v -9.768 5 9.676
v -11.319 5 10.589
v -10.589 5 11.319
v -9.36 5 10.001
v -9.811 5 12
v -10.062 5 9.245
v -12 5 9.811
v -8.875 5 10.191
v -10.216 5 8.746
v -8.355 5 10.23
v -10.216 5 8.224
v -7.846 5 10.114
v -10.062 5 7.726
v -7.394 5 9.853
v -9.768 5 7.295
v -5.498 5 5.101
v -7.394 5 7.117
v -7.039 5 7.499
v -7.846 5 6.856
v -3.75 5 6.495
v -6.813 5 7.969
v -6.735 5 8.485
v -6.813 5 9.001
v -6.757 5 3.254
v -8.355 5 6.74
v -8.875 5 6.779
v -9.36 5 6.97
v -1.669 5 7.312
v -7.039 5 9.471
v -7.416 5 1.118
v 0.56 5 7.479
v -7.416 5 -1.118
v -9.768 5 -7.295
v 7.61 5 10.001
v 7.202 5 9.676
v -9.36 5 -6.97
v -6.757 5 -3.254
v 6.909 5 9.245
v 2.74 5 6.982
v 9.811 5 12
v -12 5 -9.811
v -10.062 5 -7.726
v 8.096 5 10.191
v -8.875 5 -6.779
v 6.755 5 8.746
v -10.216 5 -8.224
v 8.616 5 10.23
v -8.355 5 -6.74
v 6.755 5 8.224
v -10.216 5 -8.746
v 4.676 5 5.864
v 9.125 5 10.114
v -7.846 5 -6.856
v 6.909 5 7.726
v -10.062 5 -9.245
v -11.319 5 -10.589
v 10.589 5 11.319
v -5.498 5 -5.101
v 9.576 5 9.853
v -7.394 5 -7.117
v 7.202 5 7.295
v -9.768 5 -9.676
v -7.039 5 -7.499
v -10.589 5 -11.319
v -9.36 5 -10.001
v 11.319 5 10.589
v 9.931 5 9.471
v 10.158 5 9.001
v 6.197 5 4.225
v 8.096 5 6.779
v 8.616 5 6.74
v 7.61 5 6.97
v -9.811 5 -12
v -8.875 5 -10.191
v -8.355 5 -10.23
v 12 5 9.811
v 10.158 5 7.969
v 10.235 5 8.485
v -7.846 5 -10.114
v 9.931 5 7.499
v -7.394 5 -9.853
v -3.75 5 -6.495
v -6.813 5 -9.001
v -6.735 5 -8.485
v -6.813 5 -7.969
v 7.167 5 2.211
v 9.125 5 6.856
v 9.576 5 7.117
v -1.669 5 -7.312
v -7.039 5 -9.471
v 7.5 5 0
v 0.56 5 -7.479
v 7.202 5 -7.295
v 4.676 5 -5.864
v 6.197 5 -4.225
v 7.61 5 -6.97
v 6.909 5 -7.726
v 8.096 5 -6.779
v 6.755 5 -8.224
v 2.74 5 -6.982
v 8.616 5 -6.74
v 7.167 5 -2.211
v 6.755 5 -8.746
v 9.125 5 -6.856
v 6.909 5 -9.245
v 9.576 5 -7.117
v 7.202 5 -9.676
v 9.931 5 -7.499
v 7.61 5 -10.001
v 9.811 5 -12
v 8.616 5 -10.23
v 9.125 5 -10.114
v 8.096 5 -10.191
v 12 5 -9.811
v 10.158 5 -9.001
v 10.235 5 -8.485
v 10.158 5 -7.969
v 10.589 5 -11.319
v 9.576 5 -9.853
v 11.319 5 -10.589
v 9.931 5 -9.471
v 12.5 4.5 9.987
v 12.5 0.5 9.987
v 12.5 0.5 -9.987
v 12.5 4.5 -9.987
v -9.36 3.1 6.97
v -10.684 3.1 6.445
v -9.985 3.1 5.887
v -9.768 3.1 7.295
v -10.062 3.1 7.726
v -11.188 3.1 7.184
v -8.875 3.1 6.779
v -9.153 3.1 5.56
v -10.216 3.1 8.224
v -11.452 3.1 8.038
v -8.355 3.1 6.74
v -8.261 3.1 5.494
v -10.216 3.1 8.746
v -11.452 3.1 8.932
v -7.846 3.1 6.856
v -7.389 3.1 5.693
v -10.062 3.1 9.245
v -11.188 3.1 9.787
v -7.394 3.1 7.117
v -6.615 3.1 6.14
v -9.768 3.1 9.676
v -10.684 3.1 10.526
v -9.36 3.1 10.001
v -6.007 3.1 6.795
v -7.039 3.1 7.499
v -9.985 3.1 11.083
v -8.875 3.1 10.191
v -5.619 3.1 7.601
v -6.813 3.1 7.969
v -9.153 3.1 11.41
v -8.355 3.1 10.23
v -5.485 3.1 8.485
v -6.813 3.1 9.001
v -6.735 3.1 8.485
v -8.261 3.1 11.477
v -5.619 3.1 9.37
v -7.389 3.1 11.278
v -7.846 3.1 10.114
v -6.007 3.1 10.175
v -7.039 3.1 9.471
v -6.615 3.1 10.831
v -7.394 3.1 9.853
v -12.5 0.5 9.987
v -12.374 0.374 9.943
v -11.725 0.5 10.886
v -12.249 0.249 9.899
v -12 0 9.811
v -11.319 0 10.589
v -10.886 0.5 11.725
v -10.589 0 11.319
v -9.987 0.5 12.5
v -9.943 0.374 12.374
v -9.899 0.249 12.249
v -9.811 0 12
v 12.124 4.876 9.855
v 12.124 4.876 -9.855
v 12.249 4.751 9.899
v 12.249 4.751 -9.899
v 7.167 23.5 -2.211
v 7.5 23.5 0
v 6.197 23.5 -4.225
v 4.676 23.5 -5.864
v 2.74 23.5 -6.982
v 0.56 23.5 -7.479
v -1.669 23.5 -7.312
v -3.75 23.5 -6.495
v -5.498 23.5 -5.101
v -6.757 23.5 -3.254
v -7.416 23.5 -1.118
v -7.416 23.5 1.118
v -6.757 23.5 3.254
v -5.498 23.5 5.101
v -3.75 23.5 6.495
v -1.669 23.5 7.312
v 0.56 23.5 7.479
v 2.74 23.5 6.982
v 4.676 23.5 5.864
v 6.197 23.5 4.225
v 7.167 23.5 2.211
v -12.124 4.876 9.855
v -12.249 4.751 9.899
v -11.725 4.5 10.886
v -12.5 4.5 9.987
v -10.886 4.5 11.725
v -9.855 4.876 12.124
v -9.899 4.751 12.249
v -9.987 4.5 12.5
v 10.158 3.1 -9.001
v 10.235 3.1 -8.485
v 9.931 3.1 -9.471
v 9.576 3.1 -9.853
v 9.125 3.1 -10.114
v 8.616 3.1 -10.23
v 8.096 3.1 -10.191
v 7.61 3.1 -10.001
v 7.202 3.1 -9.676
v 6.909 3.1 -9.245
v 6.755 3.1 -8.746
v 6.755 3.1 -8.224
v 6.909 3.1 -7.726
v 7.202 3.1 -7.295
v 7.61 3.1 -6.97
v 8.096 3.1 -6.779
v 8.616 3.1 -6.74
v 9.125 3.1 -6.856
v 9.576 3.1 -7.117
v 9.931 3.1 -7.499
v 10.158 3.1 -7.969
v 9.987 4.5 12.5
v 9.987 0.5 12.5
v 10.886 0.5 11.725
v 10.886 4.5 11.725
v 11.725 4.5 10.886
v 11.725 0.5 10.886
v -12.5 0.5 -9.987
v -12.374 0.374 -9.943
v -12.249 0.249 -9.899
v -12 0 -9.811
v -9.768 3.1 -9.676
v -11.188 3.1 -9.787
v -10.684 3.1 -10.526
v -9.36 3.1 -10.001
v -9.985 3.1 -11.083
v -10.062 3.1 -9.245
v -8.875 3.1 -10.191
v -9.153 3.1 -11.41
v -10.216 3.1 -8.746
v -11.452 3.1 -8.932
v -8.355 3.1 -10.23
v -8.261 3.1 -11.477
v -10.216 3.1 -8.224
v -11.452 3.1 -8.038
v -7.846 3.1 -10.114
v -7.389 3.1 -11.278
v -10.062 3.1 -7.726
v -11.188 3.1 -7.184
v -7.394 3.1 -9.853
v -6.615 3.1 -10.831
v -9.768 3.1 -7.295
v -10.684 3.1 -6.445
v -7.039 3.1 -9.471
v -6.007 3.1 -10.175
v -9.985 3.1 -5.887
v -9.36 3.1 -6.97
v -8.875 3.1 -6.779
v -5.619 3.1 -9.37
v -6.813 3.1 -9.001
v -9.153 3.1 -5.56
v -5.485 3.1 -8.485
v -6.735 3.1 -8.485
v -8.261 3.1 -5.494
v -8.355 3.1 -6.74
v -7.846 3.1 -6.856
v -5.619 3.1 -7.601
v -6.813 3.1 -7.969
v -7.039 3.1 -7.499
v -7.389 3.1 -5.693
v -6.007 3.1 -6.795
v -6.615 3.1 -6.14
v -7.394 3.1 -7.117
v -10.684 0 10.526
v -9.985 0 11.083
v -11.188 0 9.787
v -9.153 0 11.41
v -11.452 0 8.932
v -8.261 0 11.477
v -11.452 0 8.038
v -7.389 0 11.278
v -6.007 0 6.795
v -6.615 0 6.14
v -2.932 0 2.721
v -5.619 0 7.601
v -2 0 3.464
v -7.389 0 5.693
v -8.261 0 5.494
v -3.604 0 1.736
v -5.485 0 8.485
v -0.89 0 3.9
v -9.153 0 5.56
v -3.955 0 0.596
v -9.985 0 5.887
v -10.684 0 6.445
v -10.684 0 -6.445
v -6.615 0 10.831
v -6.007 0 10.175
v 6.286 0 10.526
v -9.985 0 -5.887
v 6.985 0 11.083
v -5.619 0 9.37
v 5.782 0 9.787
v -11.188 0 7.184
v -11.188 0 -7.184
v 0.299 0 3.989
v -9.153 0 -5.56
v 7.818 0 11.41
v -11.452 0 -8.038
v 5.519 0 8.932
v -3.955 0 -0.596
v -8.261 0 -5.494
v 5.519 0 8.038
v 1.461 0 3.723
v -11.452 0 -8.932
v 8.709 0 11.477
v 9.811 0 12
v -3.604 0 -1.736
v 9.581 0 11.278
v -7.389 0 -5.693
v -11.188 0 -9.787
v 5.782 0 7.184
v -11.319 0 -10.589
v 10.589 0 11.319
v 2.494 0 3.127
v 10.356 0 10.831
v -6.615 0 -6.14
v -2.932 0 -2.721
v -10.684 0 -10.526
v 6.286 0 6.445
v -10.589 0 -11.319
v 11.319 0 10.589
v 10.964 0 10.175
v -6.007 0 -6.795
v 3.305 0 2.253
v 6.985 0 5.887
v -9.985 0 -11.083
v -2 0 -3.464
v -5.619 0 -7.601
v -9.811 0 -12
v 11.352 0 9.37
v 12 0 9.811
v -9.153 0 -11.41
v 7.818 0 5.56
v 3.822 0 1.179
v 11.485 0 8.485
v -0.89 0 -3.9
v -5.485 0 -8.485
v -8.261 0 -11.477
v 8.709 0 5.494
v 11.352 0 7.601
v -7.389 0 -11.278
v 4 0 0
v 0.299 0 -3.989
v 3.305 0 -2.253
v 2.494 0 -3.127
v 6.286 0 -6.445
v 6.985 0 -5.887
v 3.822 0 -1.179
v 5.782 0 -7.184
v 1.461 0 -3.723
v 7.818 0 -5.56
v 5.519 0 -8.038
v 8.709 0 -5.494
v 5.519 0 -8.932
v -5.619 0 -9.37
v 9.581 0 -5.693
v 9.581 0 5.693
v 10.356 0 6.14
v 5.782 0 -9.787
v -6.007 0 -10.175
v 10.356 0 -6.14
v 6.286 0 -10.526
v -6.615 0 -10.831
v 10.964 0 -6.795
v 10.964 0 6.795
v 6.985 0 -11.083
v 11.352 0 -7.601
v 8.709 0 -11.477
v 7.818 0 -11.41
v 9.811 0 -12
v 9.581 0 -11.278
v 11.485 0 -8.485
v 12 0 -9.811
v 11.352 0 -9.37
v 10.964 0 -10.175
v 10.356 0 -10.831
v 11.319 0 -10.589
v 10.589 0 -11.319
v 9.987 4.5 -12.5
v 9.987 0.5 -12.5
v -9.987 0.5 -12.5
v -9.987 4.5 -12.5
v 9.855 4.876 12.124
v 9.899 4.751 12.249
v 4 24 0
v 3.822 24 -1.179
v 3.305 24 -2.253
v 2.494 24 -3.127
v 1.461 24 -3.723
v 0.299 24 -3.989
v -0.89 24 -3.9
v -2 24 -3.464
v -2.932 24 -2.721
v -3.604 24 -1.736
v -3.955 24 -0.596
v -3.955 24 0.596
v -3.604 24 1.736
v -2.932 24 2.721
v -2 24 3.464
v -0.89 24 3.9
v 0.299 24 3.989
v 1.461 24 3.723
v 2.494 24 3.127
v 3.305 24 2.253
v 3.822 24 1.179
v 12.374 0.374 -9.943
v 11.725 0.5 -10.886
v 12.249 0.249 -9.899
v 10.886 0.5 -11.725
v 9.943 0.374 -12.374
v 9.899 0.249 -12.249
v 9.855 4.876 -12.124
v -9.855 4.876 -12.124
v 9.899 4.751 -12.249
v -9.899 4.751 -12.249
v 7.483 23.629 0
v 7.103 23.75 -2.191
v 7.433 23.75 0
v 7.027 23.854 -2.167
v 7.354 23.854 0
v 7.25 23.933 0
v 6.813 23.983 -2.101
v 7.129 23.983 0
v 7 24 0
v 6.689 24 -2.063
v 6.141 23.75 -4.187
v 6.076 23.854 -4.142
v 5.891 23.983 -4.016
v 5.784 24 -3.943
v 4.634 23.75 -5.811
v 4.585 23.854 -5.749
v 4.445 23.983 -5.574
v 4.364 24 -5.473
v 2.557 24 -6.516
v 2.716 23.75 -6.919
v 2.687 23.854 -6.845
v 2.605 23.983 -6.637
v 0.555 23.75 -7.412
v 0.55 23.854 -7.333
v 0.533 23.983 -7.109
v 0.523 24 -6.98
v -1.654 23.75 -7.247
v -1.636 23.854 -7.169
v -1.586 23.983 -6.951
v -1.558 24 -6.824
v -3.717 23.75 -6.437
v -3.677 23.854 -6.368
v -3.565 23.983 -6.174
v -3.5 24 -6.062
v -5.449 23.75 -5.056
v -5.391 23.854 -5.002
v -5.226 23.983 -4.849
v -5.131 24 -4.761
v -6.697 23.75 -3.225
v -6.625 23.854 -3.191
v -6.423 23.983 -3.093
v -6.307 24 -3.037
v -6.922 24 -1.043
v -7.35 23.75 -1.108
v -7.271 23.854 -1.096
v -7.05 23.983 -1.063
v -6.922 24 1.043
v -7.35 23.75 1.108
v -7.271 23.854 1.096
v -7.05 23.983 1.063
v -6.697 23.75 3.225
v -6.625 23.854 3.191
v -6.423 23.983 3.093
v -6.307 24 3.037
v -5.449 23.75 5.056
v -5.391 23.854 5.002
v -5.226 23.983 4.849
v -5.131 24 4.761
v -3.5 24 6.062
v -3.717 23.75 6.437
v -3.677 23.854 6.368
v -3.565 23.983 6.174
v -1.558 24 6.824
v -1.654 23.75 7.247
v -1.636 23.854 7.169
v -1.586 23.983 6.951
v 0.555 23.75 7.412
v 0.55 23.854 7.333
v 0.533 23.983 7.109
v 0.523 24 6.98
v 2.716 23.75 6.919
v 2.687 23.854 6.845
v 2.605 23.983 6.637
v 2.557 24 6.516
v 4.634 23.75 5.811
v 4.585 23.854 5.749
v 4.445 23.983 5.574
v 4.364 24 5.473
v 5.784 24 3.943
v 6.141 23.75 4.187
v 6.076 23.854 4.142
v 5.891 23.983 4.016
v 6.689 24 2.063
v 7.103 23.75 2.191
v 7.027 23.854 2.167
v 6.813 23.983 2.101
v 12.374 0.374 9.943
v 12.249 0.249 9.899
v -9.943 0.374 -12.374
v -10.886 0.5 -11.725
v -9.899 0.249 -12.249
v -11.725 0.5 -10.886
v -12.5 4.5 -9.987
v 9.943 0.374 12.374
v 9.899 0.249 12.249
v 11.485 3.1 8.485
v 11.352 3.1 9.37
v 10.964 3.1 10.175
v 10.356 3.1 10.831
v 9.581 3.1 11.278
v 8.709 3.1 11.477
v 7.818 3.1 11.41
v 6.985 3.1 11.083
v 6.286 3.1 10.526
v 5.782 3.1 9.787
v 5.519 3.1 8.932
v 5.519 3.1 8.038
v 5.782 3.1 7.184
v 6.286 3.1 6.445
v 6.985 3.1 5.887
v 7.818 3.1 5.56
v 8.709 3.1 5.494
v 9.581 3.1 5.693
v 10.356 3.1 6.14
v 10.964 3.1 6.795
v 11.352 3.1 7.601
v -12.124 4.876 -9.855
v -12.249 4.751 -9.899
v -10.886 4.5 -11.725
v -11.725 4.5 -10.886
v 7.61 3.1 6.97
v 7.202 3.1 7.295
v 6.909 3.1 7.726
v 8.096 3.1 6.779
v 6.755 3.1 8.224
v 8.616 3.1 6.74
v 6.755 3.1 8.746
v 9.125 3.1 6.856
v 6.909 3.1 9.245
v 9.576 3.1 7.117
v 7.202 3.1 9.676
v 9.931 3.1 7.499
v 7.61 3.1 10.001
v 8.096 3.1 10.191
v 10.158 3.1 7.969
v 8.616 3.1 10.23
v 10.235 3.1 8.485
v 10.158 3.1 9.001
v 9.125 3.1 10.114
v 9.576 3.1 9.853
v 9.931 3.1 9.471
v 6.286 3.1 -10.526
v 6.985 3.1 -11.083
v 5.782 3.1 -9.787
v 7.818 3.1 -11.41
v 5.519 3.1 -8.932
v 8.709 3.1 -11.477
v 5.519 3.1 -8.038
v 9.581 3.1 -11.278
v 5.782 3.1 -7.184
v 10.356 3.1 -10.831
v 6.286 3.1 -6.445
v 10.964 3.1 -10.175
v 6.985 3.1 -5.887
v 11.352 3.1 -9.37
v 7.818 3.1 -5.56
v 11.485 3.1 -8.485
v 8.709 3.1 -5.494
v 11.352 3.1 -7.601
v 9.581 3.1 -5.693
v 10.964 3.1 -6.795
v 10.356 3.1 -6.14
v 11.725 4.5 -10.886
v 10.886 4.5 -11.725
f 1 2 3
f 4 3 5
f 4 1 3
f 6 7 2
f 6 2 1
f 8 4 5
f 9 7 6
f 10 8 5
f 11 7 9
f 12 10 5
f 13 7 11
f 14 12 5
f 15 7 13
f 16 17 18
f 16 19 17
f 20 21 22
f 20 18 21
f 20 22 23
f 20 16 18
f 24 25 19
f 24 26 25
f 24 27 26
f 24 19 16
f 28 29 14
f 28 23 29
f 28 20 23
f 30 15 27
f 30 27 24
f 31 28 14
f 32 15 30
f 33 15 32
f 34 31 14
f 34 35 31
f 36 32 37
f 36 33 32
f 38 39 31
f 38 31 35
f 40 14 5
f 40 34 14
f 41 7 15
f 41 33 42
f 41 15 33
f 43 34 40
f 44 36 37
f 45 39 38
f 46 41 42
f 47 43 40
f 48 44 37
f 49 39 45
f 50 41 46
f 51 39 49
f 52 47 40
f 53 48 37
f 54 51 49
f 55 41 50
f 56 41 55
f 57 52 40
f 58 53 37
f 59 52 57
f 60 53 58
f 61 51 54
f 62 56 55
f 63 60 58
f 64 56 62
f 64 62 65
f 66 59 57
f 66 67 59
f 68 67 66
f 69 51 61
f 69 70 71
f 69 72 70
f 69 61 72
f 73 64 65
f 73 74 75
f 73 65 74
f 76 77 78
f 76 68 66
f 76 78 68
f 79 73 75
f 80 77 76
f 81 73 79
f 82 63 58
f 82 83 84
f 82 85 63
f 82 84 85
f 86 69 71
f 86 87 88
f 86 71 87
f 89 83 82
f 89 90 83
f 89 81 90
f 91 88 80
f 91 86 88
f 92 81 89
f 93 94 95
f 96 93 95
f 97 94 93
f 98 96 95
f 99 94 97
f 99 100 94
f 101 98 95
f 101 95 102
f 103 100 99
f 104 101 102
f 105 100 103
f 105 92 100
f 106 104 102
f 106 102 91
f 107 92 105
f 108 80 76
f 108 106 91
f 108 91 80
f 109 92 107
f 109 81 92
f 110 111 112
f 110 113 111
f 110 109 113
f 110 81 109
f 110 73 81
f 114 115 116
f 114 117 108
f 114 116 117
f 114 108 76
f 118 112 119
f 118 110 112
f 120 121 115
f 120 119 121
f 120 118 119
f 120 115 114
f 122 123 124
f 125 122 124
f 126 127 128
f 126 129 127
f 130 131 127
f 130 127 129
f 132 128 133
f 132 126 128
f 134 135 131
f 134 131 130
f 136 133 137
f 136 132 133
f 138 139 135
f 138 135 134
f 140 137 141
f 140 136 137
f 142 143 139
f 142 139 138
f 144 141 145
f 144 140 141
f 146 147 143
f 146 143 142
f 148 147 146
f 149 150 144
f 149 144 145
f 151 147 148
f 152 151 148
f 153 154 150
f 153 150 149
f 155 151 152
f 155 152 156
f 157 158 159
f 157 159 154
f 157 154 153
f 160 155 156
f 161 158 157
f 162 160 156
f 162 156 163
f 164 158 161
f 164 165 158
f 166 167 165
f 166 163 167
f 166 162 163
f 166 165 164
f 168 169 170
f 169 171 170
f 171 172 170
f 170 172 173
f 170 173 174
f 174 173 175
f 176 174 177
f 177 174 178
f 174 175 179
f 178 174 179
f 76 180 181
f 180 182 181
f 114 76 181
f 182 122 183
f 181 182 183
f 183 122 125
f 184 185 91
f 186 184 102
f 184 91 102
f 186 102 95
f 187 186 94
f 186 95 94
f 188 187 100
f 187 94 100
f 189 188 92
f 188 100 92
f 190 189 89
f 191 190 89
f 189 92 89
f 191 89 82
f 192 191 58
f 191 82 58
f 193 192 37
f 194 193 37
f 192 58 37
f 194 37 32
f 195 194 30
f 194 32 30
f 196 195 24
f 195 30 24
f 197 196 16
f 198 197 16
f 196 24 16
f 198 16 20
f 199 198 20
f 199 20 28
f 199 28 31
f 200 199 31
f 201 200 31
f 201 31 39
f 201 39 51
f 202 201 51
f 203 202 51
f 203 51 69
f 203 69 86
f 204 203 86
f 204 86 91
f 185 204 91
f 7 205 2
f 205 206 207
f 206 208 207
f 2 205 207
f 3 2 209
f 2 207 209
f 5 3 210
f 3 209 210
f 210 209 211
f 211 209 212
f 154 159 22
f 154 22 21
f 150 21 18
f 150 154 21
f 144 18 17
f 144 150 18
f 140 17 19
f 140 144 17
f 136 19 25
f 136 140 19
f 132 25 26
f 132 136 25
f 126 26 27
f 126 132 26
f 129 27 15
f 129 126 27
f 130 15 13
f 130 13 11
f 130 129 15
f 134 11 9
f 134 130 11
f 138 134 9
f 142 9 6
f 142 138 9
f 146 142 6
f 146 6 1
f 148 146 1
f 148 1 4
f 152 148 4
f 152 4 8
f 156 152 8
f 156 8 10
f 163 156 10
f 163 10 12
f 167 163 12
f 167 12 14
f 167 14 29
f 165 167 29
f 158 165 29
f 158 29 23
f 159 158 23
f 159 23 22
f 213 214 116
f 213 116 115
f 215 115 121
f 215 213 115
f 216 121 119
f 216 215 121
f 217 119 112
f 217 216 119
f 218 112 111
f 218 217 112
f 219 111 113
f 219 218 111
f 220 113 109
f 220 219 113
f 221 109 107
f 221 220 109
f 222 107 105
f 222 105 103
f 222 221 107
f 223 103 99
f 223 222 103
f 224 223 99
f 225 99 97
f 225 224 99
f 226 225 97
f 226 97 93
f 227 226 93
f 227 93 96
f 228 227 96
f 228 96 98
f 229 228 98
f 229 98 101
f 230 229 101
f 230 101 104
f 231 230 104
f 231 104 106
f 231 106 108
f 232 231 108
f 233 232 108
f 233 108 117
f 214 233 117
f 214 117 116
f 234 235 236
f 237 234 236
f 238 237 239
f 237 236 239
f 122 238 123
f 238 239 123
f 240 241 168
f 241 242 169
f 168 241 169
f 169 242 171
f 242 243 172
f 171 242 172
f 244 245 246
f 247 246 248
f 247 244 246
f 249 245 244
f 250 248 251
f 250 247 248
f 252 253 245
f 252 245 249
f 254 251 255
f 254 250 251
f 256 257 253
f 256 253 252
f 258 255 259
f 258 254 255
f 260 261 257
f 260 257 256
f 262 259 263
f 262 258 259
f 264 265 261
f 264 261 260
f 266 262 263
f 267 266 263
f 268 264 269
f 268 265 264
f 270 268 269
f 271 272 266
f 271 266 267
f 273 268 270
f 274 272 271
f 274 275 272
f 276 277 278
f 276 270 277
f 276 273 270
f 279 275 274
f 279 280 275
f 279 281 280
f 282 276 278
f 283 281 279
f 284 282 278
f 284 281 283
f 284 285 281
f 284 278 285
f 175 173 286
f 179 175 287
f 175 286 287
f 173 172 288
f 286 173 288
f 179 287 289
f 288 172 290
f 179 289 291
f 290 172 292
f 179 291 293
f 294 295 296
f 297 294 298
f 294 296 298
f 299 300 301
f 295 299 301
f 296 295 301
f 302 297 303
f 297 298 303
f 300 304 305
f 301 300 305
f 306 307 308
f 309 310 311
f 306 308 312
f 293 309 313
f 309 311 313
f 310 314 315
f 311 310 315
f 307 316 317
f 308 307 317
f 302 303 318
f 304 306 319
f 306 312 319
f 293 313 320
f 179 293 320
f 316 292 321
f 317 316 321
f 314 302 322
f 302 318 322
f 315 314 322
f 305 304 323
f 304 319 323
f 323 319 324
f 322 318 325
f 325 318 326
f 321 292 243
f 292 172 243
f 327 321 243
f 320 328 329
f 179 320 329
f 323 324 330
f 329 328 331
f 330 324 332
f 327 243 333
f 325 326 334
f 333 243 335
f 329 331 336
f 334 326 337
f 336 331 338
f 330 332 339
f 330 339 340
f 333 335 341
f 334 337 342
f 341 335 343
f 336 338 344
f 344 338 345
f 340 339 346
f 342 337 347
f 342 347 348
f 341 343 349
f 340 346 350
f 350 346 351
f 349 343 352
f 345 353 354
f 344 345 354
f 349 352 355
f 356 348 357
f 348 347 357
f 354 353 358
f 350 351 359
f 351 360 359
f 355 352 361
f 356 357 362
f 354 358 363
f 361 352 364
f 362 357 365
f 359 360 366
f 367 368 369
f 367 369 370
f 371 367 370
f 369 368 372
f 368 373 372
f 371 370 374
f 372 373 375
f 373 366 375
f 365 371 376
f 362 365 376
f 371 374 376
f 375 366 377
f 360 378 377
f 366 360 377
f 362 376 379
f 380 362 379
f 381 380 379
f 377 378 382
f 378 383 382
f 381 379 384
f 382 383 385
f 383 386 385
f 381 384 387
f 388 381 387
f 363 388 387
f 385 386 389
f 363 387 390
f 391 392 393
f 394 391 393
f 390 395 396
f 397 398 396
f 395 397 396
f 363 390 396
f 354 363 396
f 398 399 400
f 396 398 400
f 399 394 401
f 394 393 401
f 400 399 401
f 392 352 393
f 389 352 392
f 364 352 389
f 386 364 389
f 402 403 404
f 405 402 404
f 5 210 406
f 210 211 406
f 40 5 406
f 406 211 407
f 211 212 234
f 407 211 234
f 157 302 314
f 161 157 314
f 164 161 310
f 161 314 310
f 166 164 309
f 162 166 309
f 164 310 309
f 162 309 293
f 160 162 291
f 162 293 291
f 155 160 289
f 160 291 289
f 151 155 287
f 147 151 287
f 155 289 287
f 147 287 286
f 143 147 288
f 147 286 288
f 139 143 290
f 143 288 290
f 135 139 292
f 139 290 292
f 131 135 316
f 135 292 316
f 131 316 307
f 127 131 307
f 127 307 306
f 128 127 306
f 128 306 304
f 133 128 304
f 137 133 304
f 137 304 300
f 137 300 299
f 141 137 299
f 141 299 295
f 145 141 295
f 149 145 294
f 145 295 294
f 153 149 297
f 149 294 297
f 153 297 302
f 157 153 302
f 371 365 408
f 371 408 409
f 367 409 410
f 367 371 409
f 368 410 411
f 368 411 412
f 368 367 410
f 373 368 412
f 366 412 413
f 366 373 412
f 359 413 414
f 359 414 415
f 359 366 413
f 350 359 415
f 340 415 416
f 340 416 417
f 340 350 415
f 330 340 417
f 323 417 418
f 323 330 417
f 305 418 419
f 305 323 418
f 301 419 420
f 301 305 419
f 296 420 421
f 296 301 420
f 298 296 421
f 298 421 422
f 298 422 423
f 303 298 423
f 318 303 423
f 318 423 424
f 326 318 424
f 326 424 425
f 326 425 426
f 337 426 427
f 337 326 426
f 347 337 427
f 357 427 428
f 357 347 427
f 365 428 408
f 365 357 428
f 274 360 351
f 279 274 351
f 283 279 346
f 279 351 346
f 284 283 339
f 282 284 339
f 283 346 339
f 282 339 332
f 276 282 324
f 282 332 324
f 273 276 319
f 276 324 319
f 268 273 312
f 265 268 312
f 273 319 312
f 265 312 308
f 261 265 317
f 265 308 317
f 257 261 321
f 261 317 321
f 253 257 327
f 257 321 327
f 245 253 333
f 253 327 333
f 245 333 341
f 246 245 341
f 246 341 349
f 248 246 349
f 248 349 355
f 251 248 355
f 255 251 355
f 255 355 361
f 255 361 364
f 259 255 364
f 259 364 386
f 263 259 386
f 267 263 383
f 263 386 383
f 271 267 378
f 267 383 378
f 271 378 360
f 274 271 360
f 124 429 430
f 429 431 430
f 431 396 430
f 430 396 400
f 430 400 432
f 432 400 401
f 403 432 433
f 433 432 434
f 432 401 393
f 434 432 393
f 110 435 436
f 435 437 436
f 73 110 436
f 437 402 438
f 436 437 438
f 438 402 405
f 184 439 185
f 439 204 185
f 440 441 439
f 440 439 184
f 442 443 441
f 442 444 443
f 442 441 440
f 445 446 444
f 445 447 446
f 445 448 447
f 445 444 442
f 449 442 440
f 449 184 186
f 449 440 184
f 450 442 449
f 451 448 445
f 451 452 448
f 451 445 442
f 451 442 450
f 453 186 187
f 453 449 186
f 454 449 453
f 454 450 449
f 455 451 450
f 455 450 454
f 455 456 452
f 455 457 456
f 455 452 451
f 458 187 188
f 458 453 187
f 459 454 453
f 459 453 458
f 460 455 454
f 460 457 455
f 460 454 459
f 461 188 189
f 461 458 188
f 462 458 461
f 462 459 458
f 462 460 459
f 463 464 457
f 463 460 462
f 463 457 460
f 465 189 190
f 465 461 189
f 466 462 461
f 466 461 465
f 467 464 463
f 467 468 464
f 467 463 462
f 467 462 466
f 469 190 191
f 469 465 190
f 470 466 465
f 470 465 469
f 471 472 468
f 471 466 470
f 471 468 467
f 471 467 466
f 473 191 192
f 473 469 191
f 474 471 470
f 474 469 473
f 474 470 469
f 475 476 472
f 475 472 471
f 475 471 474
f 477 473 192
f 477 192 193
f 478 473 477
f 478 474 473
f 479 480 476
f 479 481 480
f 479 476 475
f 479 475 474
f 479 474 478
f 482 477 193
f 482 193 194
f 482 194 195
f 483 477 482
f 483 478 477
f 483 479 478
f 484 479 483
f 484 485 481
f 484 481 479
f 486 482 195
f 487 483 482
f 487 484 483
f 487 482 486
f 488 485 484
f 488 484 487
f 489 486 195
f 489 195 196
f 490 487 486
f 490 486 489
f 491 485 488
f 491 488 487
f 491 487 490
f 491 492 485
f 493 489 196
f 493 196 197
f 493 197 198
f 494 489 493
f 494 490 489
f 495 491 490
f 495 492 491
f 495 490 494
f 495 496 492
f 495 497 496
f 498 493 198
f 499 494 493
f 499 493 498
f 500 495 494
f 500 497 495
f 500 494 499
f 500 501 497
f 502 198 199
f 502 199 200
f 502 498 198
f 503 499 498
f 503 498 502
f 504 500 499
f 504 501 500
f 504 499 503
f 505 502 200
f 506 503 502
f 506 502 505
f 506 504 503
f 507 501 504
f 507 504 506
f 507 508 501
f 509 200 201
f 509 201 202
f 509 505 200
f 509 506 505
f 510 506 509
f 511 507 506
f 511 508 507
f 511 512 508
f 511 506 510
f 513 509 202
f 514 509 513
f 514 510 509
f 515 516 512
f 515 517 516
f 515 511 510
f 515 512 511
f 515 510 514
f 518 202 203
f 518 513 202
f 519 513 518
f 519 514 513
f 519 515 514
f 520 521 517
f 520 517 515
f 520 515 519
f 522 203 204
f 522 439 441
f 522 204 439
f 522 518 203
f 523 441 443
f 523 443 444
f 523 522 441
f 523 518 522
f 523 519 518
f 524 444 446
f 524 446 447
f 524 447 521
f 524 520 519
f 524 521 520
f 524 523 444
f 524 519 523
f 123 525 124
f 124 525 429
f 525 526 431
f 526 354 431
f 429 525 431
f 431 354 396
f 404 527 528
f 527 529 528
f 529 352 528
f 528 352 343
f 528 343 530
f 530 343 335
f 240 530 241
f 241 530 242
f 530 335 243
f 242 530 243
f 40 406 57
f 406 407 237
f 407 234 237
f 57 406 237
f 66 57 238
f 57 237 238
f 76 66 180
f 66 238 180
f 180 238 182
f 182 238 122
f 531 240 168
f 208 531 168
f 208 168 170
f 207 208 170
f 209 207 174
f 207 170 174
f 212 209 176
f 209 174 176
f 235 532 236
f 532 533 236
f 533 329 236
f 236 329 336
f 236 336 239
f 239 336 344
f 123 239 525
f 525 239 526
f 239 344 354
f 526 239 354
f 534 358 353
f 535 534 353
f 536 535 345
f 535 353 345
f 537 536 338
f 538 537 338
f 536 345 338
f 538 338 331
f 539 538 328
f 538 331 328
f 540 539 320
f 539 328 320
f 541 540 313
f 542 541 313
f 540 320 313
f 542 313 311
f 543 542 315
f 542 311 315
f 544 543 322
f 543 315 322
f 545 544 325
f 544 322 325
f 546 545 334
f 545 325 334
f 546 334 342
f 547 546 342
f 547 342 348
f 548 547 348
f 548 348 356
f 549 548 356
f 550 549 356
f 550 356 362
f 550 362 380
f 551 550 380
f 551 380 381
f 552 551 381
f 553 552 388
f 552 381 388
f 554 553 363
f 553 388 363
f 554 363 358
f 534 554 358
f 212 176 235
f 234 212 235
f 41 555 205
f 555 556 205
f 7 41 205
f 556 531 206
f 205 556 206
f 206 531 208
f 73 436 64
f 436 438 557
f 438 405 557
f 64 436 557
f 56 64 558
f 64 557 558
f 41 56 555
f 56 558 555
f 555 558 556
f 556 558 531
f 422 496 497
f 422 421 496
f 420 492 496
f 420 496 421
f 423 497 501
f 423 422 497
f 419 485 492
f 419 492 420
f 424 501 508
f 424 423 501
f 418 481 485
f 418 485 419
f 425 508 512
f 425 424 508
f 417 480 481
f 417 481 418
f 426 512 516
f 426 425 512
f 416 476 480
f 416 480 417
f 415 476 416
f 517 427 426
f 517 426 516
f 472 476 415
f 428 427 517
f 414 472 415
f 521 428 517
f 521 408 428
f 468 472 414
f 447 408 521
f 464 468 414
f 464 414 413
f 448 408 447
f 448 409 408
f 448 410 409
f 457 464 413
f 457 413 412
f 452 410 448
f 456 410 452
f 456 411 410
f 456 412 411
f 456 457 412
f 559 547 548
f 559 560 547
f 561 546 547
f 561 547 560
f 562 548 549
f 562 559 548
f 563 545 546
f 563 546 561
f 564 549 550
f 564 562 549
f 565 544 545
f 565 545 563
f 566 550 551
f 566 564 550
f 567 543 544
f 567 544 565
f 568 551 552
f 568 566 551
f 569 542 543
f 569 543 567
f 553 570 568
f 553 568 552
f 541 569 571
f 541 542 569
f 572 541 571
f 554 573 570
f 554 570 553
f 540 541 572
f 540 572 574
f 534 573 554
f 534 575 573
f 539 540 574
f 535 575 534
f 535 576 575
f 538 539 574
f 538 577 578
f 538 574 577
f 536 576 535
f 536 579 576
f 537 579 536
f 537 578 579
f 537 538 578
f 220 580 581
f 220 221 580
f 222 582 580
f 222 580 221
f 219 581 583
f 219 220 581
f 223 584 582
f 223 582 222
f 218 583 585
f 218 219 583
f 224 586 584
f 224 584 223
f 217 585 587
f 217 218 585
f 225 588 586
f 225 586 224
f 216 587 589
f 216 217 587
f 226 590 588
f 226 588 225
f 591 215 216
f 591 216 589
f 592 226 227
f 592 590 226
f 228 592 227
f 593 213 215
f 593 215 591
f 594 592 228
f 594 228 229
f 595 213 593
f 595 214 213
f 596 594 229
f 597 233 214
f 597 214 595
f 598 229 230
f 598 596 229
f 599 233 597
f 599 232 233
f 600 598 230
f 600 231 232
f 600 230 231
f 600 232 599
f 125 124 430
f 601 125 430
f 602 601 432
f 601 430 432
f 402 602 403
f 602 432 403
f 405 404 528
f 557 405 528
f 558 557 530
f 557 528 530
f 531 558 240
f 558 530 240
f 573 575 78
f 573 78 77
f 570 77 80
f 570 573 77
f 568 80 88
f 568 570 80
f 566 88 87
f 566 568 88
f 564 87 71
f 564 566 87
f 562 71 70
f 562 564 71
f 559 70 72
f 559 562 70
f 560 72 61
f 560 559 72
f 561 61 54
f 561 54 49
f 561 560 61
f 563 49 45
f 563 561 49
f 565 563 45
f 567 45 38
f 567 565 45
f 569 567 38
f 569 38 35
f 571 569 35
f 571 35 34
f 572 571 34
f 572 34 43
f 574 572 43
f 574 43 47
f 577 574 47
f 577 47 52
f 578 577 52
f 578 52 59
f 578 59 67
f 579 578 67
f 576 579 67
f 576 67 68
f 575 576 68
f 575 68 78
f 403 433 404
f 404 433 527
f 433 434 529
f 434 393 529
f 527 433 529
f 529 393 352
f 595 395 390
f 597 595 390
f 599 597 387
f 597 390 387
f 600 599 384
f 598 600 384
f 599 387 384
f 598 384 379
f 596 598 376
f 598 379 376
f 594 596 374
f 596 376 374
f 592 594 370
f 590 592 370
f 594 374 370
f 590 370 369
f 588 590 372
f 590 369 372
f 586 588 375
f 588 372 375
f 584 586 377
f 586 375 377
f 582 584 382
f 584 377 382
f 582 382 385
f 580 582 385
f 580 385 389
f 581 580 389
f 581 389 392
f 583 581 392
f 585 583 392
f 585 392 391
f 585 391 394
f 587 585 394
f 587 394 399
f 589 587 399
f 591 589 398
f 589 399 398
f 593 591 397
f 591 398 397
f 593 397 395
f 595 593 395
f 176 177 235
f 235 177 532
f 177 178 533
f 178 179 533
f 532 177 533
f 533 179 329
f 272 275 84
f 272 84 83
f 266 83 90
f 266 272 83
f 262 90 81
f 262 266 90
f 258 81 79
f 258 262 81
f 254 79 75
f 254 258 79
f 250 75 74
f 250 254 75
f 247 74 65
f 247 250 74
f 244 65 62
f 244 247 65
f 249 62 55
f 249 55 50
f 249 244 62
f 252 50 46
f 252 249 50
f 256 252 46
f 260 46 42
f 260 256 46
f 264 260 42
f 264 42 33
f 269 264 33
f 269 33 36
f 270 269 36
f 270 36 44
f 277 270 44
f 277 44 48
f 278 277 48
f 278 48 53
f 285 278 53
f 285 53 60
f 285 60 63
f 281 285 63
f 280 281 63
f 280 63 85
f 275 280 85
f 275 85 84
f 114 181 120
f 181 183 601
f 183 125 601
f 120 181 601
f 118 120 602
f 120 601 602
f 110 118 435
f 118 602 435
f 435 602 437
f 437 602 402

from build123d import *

# Parameters (mm, degrees)
SKETCH_1_R          = 1.75
SKETCH_1_R_2        = 7.5
EXTRUDE_1_DEPTH     = 5
SKETCH_1_3_R        = 7.5
SKETCH_1_3_R_2      = 4
EXTRUDE_2_DEPTH     = 24
SKETCH_2_R          = 3
CUT_EXTRUDE_1_DEPTH = 3.1
CHAMFER_1_SIZE      = 0.5
CHAMFER_2_SIZE      = 0.5
FILLET_1_R          = 0.5


with BuildPart() as part:
    # 草图1 → 凸台-拉伸1 (new body)
    with BuildSketch(Plane(origin=(0, 0, 0), x_dir=(1, 0, 0), z_dir=(0, 1, 0))):
        with BuildLine():
            ThreePointArc((-12.5, -9.987492178), (-11.313708499, -11.313708499), (-9.987492178, -12.5))
            Line((-9.987492178, -12.5), (9.987492178, -12.5))
            ThreePointArc((9.987492178, -12.5), (11.313708499, -11.313708499), (12.5, -9.987492178))
            Line((12.5, -9.987492178), (12.5, 9.987492178))
            ThreePointArc((12.5, 9.987492178), (11.313708499, 11.313708499), (9.987492178, 12.5))
            Line((9.987492178, 12.5), (-9.987492178, 12.5))
            ThreePointArc((-9.987492178, 12.5), (-11.313708499, 11.313708499), (-12.5, 9.987492178))
            Line((-12.5, 9.987492178), (-12.5, -9.987492178))
        make_face()
        with Locations((-8.485281374, -8.485281374)):
            Circle(SKETCH_1_R, mode=Mode.SUBTRACT)
        with Locations((8.485281374, -8.485281374)):
            Circle(SKETCH_1_R, mode=Mode.SUBTRACT)
        with Locations((-8.485281374, 8.485281374)):
            Circle(SKETCH_1_R, mode=Mode.SUBTRACT)
        Circle(SKETCH_1_R_2, mode=Mode.SUBTRACT)
        with Locations((8.485281374, 8.485281374)):
            Circle(SKETCH_1_R, mode=Mode.SUBTRACT)
    extrude(amount=EXTRUDE_1_DEPTH)

    # 草图1<3> → 凸台-拉伸2 (add)
    with BuildSketch(Plane(origin=(0, 0, 0), x_dir=(1, 0, 0), z_dir=(0, 1, 0))):
        Circle(SKETCH_1_3_R)
        Circle(SKETCH_1_3_R_2, mode=Mode.SUBTRACT)
    extrude(amount=EXTRUDE_2_DEPTH)

    # 草图2 → 切除-拉伸1 (cut)
    with BuildSketch(Plane.XZ):
        with Locations((-8.485281374, 8.485281374)):
            Circle(SKETCH_2_R)
        with Locations((8.485281374, 8.485281374)):
            Circle(SKETCH_2_R)
        with Locations((8.485281374, -8.485281374)):
            Circle(SKETCH_2_R)
        with Locations((-8.485281374, -8.485281374)):
            Circle(SKETCH_2_R)
    extrude(amount=-CUT_EXTRUDE_1_DEPTH, mode=Mode.SUBTRACT)

    # 倒角1
    chamfer_1_edges = [part.edges().sort_by_distance(p)[0] for p in [
        (0, 5, 12.5),
        (11.313708499, 5, 11.313708499),
        (12.5, 5, 0),
        (11.313708499, 5, -11.313708499),
        (0, 5, -12.5),
        (-11.313708499, 5, -11.313708499),
        (-12.5, 5, 0),
        (-11.313708499, 5, 11.313708499),
    ]]
    chamfer(chamfer_1_edges, length=CHAMFER_1_SIZE)

    # 倒角2
    chamfer_2_edges = [part.edges().sort_by_distance(p)[0] for p in [
        (-11.313708499, 0, 11.313708499),
        (-12.5, 0, 0),
        (-11.313708499, 0, -11.313708499),
        (0, 0, -12.5),
        (11.313708499, 0, -11.313708499),
        (12.5, 0, 0),
        (11.313708499, 0, 11.313708499),
        (0, 0, 12.5),
    ]]
    chamfer(chamfer_2_edges, length=CHAMFER_2_SIZE)

    # 圆角1
    fillet_1_edges = [part.edges().sort_by_distance(p)[0] for p in [
        (-7.5, 24, 0),
    ]]
    fillet(fillet_1_edges, radius=FILLET_1_R)


solid = part.part
